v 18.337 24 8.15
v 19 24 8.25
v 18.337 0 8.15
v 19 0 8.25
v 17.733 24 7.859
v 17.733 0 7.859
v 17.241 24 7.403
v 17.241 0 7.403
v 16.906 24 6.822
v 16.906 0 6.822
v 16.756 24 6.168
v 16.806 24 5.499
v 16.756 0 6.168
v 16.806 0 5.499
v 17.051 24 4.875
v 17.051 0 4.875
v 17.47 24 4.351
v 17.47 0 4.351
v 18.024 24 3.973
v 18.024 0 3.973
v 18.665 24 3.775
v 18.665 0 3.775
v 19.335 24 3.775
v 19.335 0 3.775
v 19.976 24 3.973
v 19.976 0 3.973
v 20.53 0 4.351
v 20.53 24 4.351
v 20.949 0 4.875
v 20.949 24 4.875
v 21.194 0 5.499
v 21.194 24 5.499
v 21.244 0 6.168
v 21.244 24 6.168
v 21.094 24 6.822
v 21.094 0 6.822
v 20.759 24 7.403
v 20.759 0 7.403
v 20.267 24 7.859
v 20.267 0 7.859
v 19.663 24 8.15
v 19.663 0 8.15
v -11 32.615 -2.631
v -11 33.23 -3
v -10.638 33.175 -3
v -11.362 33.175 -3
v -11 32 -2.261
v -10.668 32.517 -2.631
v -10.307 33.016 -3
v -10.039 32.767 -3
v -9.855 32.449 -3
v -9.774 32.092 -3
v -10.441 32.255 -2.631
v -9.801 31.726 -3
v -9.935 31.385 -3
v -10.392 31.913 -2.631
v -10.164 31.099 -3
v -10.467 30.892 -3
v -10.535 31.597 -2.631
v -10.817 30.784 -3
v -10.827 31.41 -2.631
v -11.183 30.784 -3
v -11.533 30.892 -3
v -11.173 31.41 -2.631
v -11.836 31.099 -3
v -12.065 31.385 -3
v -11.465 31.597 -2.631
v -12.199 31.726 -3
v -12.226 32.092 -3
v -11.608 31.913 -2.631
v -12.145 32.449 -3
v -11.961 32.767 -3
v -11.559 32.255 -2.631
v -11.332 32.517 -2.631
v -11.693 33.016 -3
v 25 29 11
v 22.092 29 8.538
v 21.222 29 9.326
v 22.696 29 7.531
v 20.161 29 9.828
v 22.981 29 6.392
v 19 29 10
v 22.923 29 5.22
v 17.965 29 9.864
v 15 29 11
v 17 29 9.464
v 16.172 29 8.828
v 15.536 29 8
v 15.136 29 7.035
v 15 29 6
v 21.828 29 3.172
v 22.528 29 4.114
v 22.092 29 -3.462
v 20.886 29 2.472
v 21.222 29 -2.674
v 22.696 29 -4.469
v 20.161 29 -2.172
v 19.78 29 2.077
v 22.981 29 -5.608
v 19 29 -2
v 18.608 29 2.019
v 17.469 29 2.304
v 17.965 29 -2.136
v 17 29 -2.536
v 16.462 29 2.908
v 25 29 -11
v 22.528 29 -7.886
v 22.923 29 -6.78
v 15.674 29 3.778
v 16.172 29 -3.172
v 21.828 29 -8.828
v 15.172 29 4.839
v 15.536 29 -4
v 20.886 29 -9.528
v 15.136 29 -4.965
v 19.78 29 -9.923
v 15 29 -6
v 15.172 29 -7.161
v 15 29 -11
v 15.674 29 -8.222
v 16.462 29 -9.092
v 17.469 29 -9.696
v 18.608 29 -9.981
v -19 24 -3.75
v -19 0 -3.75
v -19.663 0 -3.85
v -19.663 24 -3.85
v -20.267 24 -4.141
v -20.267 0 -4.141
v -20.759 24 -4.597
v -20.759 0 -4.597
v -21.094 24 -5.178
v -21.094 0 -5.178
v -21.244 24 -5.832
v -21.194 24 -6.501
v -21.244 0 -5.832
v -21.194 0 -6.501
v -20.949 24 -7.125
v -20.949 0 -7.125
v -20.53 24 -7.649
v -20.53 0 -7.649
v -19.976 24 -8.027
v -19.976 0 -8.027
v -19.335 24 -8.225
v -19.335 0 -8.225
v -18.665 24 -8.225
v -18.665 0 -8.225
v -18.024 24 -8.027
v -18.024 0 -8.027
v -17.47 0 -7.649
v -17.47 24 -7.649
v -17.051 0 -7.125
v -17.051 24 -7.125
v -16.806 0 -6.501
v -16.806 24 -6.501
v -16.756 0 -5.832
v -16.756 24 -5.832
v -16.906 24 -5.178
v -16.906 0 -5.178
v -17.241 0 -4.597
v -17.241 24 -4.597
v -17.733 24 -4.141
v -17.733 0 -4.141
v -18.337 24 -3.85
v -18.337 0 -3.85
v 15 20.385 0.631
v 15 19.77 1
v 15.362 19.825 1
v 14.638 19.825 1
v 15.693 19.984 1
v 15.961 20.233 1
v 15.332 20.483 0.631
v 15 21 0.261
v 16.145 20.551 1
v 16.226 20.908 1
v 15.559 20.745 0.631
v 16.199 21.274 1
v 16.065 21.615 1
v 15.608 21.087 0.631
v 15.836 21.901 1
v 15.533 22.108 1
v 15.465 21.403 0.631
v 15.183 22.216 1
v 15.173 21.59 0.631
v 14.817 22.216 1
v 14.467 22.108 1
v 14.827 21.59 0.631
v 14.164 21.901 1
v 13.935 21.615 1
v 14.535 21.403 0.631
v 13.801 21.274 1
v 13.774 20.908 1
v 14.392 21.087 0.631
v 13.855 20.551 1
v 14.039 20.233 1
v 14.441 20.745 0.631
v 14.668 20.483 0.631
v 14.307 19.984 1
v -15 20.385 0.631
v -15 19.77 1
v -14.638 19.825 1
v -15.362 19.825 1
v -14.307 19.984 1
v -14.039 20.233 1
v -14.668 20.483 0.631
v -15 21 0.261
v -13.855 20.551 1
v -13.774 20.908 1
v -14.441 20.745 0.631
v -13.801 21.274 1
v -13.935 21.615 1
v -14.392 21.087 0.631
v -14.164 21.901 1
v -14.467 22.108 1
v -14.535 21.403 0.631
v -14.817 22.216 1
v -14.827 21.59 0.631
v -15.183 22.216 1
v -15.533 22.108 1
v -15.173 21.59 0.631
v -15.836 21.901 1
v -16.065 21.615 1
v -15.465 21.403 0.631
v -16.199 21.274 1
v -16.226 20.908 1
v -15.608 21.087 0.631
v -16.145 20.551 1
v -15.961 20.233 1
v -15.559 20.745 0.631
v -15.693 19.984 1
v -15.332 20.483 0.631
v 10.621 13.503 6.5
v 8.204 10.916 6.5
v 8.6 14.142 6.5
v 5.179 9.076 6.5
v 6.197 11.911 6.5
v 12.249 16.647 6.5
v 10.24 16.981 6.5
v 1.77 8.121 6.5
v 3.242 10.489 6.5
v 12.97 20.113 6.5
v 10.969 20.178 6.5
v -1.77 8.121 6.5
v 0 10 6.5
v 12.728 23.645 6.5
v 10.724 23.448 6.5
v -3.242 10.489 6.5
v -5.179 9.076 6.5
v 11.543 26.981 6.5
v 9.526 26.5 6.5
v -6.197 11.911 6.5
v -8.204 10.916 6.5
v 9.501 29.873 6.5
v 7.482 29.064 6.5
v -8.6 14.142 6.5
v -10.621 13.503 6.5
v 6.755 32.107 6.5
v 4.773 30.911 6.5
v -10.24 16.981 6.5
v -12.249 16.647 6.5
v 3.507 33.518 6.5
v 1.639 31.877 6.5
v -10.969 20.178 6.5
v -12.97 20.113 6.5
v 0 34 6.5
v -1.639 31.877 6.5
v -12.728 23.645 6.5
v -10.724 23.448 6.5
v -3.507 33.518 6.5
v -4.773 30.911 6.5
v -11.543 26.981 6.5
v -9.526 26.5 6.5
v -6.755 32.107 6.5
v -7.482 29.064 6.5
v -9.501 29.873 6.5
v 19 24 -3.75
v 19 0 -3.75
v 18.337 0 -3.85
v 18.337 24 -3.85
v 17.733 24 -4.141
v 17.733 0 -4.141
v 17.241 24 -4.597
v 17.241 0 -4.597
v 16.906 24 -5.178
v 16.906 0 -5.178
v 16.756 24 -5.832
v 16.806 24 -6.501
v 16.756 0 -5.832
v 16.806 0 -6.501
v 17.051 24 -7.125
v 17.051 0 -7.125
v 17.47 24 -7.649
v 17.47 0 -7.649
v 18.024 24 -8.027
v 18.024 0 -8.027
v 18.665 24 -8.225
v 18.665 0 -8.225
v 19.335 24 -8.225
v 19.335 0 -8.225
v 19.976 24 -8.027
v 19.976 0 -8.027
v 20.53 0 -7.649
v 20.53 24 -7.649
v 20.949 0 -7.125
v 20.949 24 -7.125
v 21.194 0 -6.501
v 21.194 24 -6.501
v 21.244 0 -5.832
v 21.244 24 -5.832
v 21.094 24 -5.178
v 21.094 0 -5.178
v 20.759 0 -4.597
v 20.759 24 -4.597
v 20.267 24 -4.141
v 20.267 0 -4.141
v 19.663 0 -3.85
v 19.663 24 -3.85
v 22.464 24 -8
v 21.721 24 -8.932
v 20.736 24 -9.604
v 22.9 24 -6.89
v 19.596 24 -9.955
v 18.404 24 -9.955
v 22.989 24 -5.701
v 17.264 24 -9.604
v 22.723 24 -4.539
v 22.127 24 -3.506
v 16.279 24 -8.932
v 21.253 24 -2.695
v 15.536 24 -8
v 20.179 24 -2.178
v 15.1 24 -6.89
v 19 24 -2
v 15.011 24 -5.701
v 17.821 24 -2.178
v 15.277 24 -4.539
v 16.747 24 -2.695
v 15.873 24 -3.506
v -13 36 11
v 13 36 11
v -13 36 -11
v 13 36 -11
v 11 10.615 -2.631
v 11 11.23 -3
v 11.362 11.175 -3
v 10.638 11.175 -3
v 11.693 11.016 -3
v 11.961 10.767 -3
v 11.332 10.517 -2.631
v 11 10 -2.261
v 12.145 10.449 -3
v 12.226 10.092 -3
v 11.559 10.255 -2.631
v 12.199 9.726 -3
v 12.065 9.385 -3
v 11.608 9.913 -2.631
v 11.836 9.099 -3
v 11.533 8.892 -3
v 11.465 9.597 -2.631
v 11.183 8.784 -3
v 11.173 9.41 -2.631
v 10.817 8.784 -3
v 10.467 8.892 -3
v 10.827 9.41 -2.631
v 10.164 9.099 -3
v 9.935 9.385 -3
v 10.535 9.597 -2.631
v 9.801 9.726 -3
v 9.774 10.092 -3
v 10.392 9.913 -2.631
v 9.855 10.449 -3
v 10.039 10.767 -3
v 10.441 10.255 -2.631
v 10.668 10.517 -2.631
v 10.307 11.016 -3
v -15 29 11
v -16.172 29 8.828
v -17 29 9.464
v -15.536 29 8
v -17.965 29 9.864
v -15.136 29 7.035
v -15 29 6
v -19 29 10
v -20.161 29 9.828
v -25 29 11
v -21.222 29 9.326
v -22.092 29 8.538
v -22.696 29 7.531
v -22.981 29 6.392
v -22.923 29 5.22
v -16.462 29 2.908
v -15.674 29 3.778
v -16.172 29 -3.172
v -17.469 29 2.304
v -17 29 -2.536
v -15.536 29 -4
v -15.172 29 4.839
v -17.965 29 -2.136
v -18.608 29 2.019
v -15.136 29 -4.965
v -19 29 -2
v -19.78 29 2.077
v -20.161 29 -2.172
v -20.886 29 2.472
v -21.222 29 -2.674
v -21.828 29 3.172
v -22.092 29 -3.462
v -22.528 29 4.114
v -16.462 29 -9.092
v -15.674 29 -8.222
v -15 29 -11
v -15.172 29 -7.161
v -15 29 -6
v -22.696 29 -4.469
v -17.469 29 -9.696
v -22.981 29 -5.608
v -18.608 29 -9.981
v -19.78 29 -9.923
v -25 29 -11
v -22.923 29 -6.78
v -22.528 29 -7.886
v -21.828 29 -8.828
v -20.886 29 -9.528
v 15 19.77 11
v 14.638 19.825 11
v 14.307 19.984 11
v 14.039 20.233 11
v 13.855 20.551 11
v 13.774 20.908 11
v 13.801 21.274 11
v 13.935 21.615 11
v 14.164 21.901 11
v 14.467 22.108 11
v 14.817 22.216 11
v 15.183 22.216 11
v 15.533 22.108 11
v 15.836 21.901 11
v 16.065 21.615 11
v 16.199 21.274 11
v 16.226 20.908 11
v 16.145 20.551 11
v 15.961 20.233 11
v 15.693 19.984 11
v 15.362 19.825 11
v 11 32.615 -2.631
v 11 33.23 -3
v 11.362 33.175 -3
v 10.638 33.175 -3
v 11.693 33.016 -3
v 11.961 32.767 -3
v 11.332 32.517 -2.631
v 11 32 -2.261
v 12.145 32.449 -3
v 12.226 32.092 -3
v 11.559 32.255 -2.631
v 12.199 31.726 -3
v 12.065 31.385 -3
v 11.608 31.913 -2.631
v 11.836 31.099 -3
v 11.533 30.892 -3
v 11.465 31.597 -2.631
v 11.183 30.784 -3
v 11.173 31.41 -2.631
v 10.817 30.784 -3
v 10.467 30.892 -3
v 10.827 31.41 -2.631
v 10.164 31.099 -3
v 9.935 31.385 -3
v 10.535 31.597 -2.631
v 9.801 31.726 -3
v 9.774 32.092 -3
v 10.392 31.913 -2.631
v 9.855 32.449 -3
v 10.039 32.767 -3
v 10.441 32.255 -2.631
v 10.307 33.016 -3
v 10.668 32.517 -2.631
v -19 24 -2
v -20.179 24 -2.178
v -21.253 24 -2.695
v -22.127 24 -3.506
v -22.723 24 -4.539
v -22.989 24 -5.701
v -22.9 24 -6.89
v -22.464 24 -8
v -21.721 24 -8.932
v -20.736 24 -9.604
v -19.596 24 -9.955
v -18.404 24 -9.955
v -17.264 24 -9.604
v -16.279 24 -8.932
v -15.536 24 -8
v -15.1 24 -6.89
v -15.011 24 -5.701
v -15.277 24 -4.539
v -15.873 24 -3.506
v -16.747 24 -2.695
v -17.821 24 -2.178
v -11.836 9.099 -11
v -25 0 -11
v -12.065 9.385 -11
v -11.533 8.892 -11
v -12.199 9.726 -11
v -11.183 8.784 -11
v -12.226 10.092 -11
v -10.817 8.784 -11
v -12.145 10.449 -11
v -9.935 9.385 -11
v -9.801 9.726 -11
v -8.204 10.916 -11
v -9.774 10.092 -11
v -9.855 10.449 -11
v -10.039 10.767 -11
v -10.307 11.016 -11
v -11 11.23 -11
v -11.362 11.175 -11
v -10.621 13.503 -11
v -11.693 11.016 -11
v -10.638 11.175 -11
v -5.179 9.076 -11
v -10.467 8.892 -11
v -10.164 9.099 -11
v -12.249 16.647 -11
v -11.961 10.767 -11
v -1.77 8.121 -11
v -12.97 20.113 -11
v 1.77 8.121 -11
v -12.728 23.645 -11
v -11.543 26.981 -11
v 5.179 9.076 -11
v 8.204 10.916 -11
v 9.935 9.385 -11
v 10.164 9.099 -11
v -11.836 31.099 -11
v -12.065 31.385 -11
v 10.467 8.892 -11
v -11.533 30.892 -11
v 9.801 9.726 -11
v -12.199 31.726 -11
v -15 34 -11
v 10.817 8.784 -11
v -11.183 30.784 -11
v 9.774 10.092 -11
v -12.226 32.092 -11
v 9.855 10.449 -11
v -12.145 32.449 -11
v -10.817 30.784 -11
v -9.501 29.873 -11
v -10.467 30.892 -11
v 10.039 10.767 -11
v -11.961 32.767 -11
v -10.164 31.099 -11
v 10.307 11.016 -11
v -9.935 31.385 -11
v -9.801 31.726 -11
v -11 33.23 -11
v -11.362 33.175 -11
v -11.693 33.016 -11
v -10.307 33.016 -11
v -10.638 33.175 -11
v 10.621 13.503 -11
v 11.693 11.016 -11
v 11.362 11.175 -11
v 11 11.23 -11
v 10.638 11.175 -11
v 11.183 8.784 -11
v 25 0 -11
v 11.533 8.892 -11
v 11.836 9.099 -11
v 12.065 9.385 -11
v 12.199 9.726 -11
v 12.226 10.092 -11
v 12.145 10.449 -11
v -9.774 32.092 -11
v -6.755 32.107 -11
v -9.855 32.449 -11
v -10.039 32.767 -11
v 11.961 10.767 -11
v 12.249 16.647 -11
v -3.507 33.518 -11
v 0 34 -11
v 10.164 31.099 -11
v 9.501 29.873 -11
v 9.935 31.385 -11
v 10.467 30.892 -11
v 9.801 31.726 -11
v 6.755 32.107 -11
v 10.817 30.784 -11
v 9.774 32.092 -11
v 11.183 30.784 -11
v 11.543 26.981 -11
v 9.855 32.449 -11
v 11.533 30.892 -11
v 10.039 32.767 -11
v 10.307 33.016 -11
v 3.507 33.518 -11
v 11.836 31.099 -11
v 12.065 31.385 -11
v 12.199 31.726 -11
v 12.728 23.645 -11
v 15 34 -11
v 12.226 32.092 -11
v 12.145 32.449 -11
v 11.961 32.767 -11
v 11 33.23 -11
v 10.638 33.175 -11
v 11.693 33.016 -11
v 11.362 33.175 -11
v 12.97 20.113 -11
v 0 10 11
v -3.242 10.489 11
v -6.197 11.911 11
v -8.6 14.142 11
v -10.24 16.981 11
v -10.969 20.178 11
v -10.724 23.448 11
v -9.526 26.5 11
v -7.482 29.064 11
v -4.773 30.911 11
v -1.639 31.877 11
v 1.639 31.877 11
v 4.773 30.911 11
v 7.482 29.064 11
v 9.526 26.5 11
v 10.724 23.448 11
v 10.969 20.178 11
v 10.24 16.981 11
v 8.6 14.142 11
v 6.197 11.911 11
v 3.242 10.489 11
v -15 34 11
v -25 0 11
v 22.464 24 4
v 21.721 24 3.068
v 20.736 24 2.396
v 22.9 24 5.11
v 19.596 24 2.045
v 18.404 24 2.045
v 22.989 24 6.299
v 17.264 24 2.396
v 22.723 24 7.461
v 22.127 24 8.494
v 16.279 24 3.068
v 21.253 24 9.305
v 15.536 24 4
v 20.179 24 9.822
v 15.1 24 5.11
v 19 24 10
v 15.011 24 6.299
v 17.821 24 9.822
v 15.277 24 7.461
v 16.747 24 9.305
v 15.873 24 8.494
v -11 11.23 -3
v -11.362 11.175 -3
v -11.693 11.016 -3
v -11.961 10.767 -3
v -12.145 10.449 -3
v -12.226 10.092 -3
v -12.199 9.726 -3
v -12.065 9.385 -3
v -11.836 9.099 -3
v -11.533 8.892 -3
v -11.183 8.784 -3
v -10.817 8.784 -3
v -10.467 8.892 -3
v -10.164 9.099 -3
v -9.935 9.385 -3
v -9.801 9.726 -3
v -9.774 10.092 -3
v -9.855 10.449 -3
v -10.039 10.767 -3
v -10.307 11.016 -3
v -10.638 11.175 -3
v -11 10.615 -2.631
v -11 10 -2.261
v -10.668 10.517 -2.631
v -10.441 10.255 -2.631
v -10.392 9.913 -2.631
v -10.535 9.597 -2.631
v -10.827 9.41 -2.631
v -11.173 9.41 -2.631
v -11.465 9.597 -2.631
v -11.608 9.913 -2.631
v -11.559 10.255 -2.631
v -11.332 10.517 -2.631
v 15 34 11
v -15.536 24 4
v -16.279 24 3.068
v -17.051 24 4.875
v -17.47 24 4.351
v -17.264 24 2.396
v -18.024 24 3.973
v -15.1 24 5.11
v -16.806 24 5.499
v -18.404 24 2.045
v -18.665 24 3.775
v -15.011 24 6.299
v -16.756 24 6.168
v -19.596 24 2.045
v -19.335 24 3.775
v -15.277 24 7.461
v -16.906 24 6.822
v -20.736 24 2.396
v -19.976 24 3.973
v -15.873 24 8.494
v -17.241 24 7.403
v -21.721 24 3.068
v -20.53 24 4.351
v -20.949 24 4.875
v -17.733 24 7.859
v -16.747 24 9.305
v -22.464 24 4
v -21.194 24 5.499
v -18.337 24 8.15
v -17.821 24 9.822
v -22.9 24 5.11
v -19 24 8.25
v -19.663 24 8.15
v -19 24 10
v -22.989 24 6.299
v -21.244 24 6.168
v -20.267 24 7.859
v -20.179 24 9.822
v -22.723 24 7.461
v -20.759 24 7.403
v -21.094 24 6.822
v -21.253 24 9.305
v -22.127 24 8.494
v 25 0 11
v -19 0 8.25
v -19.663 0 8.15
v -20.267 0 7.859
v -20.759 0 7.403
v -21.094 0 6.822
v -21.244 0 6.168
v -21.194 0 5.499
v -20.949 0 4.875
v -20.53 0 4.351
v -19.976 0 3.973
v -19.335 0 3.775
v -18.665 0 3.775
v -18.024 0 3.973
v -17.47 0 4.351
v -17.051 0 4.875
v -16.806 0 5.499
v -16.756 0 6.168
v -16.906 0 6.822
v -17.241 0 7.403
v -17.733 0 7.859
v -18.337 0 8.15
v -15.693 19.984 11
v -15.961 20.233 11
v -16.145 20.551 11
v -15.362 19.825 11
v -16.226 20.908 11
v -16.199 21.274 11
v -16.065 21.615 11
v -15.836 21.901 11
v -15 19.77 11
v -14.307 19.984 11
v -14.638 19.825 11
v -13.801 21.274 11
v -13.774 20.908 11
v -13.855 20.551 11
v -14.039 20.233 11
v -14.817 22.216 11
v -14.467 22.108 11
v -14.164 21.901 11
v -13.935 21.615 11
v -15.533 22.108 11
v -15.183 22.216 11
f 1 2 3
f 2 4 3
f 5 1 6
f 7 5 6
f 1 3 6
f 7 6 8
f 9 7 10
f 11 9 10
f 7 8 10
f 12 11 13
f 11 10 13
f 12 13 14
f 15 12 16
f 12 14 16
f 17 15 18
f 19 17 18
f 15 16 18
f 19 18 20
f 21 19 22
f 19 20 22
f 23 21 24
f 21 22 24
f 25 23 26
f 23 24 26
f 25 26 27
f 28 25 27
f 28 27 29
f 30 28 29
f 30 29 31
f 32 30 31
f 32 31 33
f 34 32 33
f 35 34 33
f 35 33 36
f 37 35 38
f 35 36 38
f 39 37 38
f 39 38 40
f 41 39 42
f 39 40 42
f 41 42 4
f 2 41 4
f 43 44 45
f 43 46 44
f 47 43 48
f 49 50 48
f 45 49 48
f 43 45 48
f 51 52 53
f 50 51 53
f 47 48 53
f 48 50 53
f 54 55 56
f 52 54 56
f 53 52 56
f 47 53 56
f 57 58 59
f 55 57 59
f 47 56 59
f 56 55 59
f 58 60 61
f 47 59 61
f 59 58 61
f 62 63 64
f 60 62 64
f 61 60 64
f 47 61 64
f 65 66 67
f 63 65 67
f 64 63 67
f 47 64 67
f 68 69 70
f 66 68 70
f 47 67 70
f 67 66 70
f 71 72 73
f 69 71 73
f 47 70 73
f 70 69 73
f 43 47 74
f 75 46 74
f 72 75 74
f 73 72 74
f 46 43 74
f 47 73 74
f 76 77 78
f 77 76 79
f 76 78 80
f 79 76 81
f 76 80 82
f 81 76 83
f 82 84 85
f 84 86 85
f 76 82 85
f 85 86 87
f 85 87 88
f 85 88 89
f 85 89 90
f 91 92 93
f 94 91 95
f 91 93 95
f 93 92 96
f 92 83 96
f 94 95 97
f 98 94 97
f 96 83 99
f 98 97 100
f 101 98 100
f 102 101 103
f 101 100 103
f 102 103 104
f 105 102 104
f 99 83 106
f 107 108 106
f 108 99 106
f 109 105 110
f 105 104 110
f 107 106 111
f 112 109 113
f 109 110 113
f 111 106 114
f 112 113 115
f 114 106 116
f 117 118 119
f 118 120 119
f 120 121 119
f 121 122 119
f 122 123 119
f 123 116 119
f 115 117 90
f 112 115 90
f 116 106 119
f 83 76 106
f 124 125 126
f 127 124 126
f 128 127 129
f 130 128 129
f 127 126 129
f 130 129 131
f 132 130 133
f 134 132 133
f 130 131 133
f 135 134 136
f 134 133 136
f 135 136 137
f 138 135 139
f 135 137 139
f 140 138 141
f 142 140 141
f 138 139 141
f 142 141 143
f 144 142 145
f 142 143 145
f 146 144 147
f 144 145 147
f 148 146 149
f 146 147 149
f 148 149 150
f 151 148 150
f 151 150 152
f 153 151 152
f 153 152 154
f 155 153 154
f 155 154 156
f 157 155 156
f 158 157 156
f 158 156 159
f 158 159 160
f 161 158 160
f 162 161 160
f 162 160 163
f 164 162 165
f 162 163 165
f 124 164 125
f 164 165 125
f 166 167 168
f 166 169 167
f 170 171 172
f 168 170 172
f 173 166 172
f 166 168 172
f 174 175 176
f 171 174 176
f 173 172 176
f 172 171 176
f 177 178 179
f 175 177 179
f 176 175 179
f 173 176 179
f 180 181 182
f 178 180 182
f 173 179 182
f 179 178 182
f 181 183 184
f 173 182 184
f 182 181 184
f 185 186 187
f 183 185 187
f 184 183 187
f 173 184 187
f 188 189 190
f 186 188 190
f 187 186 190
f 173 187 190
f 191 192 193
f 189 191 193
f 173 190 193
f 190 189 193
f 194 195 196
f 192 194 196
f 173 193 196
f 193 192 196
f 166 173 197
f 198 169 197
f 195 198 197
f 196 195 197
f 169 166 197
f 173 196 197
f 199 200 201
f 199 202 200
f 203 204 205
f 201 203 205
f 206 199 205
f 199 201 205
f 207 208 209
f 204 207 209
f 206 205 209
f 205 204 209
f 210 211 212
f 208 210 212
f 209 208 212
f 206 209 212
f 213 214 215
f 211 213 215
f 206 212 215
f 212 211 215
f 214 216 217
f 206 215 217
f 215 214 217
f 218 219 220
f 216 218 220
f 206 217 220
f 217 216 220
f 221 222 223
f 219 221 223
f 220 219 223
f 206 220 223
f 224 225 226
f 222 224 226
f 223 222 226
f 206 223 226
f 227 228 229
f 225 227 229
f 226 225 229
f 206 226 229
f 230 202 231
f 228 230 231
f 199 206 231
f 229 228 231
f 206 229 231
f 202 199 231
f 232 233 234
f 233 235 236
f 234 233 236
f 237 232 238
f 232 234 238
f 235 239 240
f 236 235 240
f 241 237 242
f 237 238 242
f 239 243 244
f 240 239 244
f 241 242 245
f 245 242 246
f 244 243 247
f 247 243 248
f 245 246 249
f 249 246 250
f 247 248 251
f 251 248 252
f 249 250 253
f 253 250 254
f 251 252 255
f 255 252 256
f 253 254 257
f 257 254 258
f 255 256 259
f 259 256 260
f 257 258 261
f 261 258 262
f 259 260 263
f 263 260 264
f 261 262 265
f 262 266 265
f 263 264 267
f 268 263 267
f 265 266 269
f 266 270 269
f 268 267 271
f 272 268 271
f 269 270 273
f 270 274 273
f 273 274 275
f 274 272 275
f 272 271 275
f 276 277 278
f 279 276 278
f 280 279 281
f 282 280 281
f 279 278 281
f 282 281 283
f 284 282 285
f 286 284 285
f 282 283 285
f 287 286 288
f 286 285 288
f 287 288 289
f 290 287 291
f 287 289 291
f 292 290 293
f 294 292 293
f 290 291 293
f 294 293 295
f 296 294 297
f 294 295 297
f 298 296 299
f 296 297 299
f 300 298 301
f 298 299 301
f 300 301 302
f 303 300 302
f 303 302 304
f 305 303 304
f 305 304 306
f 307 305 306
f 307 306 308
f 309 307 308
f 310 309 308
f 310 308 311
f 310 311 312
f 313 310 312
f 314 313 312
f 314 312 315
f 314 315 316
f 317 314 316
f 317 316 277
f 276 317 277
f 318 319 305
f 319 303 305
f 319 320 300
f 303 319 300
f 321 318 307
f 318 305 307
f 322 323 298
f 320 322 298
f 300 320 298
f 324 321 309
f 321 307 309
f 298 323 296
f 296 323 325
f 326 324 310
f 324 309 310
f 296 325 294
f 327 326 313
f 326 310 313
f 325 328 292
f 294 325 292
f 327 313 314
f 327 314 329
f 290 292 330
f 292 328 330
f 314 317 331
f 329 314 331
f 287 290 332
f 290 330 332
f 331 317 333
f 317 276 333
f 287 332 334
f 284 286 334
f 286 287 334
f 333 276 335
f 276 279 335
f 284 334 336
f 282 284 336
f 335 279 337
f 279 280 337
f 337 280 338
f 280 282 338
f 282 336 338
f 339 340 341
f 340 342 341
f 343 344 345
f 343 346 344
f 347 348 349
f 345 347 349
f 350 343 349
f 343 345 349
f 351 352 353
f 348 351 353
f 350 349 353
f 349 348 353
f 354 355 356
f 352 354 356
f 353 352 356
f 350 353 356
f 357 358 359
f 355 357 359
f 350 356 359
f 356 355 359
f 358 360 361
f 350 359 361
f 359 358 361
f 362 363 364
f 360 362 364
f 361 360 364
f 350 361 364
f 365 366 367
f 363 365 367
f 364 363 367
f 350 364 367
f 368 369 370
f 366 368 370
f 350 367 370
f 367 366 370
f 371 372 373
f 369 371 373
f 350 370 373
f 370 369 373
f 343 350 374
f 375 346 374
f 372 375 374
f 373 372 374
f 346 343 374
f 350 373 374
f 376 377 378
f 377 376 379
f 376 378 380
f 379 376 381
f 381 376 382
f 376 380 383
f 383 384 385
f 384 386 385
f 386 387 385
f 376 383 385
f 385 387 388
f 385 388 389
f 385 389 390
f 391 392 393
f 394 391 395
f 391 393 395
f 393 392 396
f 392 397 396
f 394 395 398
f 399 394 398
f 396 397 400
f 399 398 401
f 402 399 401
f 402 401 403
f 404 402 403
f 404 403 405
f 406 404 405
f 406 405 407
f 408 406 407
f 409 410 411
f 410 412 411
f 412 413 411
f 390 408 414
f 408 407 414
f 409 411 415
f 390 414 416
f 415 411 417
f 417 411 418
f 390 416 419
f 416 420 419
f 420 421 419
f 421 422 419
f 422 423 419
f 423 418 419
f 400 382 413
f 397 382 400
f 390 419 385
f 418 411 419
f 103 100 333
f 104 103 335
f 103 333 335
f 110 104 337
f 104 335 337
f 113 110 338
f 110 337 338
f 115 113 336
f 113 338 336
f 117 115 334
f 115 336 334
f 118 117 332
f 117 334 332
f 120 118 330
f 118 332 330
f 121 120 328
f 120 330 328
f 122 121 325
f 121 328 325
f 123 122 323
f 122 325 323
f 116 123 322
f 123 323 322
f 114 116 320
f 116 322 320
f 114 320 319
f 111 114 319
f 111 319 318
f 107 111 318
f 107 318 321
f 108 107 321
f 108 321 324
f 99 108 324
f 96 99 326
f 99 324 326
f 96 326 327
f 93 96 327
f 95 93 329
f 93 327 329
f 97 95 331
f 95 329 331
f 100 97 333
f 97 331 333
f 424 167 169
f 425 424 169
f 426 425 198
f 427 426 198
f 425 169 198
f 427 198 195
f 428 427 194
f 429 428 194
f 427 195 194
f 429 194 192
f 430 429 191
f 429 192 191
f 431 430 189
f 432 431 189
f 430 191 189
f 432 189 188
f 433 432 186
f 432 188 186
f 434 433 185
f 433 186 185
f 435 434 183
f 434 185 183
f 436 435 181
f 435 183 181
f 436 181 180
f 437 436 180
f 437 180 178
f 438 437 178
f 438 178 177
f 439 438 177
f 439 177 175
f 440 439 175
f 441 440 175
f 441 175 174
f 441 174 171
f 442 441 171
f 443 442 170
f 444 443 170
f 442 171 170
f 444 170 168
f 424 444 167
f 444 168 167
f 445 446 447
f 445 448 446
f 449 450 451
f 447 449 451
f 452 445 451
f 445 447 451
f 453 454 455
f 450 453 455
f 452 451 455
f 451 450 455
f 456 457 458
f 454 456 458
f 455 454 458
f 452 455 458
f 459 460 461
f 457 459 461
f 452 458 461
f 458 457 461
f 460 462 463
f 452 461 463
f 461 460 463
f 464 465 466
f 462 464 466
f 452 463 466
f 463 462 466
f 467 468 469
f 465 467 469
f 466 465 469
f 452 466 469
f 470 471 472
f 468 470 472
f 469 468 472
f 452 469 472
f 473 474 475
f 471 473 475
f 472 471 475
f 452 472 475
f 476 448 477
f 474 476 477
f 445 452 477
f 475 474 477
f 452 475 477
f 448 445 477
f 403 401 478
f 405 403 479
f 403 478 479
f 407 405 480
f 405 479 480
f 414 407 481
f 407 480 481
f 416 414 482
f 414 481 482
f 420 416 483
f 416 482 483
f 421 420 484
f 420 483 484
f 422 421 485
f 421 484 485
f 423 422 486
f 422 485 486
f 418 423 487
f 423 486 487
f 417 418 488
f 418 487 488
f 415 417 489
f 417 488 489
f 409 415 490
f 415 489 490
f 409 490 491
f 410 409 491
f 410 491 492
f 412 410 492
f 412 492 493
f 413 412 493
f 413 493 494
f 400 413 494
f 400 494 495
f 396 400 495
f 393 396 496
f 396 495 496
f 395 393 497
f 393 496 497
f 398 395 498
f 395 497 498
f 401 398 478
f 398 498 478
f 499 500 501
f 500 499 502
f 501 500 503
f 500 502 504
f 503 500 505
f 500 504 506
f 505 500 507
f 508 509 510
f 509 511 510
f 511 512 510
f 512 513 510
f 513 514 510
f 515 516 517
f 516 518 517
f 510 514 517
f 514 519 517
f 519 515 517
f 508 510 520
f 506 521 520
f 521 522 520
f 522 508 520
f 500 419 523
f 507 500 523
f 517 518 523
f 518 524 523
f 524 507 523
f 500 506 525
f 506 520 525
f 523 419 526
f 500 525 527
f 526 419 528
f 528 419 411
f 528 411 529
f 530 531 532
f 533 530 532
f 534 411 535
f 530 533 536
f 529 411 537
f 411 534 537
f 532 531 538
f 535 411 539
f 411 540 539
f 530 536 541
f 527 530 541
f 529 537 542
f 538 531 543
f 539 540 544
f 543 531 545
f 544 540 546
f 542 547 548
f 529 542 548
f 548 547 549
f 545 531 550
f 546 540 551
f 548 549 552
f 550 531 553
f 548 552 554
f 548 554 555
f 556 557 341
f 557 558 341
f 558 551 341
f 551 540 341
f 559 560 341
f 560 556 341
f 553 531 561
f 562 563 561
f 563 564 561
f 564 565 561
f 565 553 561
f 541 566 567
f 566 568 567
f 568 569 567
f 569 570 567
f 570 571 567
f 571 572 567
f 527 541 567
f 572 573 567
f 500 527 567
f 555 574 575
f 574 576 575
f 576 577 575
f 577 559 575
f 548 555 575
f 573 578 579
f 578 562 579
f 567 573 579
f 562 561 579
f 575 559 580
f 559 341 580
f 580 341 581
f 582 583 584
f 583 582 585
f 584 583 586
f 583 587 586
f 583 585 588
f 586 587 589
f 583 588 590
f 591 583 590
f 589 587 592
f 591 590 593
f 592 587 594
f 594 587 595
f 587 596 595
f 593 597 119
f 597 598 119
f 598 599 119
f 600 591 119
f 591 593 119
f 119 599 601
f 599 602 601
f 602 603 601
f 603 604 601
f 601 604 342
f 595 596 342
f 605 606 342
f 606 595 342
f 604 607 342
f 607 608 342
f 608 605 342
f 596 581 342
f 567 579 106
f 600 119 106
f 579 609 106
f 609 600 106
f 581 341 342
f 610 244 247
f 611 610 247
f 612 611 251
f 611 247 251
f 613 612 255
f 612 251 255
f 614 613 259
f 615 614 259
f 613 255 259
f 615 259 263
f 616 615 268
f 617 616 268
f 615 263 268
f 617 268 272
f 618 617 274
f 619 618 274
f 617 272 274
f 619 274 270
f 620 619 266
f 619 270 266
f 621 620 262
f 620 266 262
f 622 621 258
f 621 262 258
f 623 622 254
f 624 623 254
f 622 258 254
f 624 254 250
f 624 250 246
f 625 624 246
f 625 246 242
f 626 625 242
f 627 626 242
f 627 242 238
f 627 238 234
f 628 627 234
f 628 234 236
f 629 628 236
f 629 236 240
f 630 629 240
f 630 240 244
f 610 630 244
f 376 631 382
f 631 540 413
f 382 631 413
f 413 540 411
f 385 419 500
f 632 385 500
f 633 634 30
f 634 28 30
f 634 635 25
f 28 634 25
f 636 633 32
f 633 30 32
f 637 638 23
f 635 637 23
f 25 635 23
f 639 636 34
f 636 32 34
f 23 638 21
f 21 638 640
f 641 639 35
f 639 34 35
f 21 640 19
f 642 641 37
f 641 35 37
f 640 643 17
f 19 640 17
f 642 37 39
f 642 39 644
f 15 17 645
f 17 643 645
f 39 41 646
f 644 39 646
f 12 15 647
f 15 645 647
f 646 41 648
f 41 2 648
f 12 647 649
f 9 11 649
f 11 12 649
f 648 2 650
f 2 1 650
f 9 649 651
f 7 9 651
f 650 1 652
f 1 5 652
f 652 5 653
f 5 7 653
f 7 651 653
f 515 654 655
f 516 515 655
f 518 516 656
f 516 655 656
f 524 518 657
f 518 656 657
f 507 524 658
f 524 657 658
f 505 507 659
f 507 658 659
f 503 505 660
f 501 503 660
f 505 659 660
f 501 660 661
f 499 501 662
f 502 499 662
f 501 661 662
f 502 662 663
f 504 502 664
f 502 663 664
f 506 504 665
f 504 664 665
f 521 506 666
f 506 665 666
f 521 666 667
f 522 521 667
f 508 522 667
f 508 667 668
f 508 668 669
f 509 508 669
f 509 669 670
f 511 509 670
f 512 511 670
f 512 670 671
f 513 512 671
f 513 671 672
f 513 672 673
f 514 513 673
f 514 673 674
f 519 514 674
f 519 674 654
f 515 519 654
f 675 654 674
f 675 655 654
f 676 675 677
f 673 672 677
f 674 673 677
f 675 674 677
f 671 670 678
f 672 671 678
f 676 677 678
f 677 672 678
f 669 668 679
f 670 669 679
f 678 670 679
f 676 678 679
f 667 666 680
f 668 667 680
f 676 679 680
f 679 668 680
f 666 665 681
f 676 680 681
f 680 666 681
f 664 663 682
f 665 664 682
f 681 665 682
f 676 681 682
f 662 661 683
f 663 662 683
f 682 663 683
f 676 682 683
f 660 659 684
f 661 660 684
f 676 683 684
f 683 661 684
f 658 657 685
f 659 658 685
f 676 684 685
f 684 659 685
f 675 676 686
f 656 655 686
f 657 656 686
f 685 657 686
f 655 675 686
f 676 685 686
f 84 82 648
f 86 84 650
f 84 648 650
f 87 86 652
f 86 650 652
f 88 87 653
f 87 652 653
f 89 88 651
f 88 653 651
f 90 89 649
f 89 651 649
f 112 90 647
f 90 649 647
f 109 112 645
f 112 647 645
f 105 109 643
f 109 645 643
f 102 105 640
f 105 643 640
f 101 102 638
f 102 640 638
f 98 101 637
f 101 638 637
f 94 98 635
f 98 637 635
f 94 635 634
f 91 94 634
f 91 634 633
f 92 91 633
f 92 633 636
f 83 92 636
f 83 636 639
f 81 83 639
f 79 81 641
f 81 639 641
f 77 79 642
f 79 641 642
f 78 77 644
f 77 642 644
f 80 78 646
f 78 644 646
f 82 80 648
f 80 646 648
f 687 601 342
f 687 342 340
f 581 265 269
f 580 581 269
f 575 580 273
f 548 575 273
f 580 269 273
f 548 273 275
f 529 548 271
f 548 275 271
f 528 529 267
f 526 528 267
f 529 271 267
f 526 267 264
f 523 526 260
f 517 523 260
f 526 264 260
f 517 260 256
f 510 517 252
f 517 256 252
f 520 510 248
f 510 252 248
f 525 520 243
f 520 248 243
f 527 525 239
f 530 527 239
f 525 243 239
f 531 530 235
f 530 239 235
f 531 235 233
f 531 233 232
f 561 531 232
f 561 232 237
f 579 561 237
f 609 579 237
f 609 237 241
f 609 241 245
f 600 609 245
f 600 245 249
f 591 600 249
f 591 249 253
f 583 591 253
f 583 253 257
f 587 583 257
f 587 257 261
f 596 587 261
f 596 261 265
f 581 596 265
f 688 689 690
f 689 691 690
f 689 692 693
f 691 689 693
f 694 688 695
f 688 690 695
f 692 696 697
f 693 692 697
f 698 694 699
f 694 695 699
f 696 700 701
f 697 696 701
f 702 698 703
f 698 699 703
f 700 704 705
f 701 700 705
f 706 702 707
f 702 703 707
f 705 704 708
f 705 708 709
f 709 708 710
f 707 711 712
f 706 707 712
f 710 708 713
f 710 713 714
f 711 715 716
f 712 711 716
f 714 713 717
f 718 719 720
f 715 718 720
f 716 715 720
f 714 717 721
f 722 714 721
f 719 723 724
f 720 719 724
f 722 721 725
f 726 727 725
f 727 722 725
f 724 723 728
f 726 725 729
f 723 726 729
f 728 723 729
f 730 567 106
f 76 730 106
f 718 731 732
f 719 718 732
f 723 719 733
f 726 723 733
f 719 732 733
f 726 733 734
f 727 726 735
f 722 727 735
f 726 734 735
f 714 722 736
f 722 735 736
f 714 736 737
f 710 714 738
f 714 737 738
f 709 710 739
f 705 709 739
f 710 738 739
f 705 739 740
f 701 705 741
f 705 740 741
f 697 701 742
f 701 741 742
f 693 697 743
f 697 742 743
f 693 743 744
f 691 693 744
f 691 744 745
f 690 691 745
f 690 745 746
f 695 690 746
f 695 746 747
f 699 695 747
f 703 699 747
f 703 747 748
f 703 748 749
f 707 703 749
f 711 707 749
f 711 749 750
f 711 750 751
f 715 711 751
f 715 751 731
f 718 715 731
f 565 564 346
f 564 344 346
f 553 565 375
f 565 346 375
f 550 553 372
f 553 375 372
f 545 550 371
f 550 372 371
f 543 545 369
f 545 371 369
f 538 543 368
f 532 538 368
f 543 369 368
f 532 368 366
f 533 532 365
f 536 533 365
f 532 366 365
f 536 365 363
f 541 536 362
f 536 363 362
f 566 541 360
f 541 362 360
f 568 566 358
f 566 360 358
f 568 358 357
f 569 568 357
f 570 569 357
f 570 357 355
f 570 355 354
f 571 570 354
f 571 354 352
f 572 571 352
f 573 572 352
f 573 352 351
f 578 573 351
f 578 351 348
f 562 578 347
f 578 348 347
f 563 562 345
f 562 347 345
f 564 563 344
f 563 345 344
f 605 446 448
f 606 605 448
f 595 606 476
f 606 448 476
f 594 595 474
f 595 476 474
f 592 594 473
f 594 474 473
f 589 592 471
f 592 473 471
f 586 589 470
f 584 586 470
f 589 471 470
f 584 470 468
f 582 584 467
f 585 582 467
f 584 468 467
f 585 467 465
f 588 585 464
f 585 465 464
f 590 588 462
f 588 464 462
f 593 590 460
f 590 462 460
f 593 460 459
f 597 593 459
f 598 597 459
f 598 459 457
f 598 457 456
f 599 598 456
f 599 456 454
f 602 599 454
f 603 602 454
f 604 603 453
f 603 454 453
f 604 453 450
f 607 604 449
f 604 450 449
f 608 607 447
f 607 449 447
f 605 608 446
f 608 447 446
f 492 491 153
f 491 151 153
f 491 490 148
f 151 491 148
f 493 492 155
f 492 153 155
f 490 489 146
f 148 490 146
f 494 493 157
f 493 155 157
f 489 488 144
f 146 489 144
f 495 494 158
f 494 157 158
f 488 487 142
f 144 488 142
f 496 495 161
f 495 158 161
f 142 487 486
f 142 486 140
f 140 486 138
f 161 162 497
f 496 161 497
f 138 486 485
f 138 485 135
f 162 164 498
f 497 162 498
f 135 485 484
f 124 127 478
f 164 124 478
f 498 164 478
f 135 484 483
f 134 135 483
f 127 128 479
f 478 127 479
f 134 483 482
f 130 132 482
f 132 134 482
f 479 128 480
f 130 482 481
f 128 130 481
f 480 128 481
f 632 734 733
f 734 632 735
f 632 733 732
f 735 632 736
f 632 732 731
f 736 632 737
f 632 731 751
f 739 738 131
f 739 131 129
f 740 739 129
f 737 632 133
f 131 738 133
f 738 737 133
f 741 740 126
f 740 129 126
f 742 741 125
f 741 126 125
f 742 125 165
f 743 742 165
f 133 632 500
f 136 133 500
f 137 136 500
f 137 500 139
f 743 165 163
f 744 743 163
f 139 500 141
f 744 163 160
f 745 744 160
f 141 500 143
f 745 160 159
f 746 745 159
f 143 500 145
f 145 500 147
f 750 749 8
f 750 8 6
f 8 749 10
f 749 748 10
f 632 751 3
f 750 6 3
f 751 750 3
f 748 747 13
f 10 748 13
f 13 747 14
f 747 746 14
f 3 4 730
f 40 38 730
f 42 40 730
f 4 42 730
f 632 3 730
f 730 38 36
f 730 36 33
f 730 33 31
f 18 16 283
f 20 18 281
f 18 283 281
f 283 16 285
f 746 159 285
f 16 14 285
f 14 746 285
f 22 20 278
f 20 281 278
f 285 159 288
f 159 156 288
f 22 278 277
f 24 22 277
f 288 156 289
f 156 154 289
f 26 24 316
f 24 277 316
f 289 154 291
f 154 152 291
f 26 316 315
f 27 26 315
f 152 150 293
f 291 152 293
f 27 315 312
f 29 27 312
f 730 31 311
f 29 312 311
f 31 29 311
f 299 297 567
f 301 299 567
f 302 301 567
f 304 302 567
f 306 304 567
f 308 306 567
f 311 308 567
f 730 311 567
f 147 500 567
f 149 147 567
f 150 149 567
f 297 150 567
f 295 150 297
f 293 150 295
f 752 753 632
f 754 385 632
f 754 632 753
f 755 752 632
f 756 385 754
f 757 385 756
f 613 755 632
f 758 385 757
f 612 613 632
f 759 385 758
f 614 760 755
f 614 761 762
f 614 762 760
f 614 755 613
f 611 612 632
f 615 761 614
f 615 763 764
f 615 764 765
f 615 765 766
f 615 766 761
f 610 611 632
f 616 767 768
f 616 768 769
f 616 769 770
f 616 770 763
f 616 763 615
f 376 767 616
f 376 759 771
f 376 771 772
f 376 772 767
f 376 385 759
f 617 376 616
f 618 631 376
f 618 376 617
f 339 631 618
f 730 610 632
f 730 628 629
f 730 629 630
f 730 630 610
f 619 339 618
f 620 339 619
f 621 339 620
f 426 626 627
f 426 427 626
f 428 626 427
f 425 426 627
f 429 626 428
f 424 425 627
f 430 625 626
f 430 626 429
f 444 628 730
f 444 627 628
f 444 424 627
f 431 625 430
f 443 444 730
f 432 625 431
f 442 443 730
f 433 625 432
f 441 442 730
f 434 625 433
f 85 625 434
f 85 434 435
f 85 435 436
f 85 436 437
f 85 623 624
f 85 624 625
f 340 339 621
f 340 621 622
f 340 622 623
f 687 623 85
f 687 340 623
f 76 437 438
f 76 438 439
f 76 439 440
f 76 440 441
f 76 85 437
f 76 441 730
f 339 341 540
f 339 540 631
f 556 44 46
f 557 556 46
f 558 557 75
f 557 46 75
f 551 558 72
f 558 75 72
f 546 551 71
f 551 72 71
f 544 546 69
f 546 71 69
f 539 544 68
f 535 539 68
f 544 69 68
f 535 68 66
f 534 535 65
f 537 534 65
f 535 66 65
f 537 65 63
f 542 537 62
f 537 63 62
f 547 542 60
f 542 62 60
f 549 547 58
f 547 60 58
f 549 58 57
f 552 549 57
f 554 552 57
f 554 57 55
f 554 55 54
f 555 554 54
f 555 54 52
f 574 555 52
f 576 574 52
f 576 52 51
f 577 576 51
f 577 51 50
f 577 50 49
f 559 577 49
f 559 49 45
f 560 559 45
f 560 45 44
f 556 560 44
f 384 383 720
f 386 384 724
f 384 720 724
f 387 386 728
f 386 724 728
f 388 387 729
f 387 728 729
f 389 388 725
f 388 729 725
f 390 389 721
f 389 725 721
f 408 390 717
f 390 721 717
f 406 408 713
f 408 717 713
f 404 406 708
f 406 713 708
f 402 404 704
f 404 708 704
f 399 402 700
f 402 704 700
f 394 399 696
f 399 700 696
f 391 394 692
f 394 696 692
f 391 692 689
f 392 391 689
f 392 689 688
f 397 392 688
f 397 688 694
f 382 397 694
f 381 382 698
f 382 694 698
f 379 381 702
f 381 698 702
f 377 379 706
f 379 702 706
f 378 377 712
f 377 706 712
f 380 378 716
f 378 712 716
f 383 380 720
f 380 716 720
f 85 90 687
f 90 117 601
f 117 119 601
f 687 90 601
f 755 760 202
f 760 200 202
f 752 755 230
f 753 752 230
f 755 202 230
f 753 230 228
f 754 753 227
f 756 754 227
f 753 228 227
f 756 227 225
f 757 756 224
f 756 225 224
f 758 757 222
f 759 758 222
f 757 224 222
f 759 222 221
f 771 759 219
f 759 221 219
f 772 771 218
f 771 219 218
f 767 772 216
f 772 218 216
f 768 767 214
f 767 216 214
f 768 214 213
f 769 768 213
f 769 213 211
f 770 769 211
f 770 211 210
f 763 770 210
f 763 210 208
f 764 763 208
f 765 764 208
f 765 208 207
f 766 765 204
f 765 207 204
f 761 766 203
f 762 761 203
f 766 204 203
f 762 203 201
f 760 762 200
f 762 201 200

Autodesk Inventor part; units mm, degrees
ref_plane "YZ Plane" through (0, 0, 0) normal (1, 0, 0) x (0, 1, 0)
ref_plane "XZ Plane" through (0, 0, 0) normal (0, 1, 0) x (-1, 0, 0)
ref_plane "XY Plane" through (0, 0, 0) normal (0, 0, 1) x (1, 0, 0)
sketch "Sketch1" plane through (0, 0, 0) normal (0, 0, 1) x (1, 0, 0)
  line L0 (-25, 0) -> (25, 0)
  line L1 (25, 0) -> (25, 29)
  line L2 (25, 29) -> (15, 29)
  line L3 (15, 29) -> (15, 36)
  line L4 (15, 36) -> (-15, 36)
  line L5 (-15, 36) -> (-15, 29)
  line L6 (-15, 29) -> (-25, 29)
  line L7 (-25, 29) -> (-25, 0)
  point P0 (0, 0)
  point P1 (0, 0)
  dimension "d0" = 50
  dimension "d1" = 36
  dimension "d2" = 7
  dimension "d3" = 30
extrude "Extrusion1" add sketch "Sketch1" along normal mid plane 22
sketch "Sketch2" plane through (0, 0, 11) normal (0, 0, 1) x (1, 0, 0)
  line L0 (-25, 0) -> (25, 0) projected
  point P0 (0, 0)
  point P1 (0, 21)
  point P2 (0, 0)
  dimension "d6" = 21
hole "Hole1" at (0, 21, 11) direction (0, 0, -1) diameter 22 end through all
chamfer "Chamfer2" distance 2 angle 45 2 edges at (-15, 36, 0) (15, 36, 0)
sketch "Sketch3" plane through (-25, 29, 11) normal (0, 1, 0) x (1, 0, 0)
  line L0 (0, 22) -> (0, 0) projected
  line L1 (50, 22) -> (50, 0) projected
  line L2 (50, 22) -> (0, 22) projected
  line L3 (0, 0) -> (50, 0) projected
  point P0 (25, 11)
  point P1 (6, 17)
  point P2 (44, 17)
  point P3 (6, 5)
  point P4 (44, 5)
  dimension "d20" = 38
  dimension "d21" = 6
  dimension "d22" = 6
  dimension "d49" = 12
  dimension "d50" = 5
  dimension "d51" = 5
hole "Hole2" at (-19, 29, -6) at (19, 29, -6) at (-19, 29, 6) at (19, 29, 6) direction (0, -1, 0) diameter 4.5 end through all counterbore diameter 8 counterbore depth 5
sketch "Sketch5" plane through (0, 0, 11) normal (0, 0, 1) x (1, 0, 0)
  circle A0 centre (0, 21) radius 11 projected
  point P0 (0, 0)
  point P1 (-15, 21)
  point P2 (15, 21)
  dimension "d40" = 30
  dimension "d52" = 15
hole "Hole4" at (-15, 21, 11) at (15, 21, 11) direction (0, 0, -1) diameter 2.459 depth 10 tip angle 118 thread size "M3x0.5" designation "M3" class "6H" standard "ISO Metric profile"
hole "Hole5" at (0, 21, -11) direction (0, 0, 1) diameter 26 depth 17.5
sketch "Sketch6" plane through (0, 0, -11) normal (0, 0, -1) x (-1, 0, 0)
  circle A0 centre (0, 21) radius 15.5563 construction
  circle A1 centre (0, 21) radius 13 construction
  point P0 (0, 0)
  point P1 (-11, 32)
  point P2 (-11, 10)
  point P3 (11, 10)
  point P4 (11, 32)
  dimension "d62" = 22
  dimension "d63" = 22
hole "Hole6" at (11, 32, -11) at (11, 10, -11) at (-11, 10, -11) at (-11, 32, -11) direction (0, 0, 1) diameter 2.459 depth 8 tip angle 118 thread size "M3x0.5" class "6H" standard "ISO Metric profile"
equation "\"d52\" = 0.5 * d40"
properties part number "Lagerbock_Loslager" material "Aluminum 6061"
